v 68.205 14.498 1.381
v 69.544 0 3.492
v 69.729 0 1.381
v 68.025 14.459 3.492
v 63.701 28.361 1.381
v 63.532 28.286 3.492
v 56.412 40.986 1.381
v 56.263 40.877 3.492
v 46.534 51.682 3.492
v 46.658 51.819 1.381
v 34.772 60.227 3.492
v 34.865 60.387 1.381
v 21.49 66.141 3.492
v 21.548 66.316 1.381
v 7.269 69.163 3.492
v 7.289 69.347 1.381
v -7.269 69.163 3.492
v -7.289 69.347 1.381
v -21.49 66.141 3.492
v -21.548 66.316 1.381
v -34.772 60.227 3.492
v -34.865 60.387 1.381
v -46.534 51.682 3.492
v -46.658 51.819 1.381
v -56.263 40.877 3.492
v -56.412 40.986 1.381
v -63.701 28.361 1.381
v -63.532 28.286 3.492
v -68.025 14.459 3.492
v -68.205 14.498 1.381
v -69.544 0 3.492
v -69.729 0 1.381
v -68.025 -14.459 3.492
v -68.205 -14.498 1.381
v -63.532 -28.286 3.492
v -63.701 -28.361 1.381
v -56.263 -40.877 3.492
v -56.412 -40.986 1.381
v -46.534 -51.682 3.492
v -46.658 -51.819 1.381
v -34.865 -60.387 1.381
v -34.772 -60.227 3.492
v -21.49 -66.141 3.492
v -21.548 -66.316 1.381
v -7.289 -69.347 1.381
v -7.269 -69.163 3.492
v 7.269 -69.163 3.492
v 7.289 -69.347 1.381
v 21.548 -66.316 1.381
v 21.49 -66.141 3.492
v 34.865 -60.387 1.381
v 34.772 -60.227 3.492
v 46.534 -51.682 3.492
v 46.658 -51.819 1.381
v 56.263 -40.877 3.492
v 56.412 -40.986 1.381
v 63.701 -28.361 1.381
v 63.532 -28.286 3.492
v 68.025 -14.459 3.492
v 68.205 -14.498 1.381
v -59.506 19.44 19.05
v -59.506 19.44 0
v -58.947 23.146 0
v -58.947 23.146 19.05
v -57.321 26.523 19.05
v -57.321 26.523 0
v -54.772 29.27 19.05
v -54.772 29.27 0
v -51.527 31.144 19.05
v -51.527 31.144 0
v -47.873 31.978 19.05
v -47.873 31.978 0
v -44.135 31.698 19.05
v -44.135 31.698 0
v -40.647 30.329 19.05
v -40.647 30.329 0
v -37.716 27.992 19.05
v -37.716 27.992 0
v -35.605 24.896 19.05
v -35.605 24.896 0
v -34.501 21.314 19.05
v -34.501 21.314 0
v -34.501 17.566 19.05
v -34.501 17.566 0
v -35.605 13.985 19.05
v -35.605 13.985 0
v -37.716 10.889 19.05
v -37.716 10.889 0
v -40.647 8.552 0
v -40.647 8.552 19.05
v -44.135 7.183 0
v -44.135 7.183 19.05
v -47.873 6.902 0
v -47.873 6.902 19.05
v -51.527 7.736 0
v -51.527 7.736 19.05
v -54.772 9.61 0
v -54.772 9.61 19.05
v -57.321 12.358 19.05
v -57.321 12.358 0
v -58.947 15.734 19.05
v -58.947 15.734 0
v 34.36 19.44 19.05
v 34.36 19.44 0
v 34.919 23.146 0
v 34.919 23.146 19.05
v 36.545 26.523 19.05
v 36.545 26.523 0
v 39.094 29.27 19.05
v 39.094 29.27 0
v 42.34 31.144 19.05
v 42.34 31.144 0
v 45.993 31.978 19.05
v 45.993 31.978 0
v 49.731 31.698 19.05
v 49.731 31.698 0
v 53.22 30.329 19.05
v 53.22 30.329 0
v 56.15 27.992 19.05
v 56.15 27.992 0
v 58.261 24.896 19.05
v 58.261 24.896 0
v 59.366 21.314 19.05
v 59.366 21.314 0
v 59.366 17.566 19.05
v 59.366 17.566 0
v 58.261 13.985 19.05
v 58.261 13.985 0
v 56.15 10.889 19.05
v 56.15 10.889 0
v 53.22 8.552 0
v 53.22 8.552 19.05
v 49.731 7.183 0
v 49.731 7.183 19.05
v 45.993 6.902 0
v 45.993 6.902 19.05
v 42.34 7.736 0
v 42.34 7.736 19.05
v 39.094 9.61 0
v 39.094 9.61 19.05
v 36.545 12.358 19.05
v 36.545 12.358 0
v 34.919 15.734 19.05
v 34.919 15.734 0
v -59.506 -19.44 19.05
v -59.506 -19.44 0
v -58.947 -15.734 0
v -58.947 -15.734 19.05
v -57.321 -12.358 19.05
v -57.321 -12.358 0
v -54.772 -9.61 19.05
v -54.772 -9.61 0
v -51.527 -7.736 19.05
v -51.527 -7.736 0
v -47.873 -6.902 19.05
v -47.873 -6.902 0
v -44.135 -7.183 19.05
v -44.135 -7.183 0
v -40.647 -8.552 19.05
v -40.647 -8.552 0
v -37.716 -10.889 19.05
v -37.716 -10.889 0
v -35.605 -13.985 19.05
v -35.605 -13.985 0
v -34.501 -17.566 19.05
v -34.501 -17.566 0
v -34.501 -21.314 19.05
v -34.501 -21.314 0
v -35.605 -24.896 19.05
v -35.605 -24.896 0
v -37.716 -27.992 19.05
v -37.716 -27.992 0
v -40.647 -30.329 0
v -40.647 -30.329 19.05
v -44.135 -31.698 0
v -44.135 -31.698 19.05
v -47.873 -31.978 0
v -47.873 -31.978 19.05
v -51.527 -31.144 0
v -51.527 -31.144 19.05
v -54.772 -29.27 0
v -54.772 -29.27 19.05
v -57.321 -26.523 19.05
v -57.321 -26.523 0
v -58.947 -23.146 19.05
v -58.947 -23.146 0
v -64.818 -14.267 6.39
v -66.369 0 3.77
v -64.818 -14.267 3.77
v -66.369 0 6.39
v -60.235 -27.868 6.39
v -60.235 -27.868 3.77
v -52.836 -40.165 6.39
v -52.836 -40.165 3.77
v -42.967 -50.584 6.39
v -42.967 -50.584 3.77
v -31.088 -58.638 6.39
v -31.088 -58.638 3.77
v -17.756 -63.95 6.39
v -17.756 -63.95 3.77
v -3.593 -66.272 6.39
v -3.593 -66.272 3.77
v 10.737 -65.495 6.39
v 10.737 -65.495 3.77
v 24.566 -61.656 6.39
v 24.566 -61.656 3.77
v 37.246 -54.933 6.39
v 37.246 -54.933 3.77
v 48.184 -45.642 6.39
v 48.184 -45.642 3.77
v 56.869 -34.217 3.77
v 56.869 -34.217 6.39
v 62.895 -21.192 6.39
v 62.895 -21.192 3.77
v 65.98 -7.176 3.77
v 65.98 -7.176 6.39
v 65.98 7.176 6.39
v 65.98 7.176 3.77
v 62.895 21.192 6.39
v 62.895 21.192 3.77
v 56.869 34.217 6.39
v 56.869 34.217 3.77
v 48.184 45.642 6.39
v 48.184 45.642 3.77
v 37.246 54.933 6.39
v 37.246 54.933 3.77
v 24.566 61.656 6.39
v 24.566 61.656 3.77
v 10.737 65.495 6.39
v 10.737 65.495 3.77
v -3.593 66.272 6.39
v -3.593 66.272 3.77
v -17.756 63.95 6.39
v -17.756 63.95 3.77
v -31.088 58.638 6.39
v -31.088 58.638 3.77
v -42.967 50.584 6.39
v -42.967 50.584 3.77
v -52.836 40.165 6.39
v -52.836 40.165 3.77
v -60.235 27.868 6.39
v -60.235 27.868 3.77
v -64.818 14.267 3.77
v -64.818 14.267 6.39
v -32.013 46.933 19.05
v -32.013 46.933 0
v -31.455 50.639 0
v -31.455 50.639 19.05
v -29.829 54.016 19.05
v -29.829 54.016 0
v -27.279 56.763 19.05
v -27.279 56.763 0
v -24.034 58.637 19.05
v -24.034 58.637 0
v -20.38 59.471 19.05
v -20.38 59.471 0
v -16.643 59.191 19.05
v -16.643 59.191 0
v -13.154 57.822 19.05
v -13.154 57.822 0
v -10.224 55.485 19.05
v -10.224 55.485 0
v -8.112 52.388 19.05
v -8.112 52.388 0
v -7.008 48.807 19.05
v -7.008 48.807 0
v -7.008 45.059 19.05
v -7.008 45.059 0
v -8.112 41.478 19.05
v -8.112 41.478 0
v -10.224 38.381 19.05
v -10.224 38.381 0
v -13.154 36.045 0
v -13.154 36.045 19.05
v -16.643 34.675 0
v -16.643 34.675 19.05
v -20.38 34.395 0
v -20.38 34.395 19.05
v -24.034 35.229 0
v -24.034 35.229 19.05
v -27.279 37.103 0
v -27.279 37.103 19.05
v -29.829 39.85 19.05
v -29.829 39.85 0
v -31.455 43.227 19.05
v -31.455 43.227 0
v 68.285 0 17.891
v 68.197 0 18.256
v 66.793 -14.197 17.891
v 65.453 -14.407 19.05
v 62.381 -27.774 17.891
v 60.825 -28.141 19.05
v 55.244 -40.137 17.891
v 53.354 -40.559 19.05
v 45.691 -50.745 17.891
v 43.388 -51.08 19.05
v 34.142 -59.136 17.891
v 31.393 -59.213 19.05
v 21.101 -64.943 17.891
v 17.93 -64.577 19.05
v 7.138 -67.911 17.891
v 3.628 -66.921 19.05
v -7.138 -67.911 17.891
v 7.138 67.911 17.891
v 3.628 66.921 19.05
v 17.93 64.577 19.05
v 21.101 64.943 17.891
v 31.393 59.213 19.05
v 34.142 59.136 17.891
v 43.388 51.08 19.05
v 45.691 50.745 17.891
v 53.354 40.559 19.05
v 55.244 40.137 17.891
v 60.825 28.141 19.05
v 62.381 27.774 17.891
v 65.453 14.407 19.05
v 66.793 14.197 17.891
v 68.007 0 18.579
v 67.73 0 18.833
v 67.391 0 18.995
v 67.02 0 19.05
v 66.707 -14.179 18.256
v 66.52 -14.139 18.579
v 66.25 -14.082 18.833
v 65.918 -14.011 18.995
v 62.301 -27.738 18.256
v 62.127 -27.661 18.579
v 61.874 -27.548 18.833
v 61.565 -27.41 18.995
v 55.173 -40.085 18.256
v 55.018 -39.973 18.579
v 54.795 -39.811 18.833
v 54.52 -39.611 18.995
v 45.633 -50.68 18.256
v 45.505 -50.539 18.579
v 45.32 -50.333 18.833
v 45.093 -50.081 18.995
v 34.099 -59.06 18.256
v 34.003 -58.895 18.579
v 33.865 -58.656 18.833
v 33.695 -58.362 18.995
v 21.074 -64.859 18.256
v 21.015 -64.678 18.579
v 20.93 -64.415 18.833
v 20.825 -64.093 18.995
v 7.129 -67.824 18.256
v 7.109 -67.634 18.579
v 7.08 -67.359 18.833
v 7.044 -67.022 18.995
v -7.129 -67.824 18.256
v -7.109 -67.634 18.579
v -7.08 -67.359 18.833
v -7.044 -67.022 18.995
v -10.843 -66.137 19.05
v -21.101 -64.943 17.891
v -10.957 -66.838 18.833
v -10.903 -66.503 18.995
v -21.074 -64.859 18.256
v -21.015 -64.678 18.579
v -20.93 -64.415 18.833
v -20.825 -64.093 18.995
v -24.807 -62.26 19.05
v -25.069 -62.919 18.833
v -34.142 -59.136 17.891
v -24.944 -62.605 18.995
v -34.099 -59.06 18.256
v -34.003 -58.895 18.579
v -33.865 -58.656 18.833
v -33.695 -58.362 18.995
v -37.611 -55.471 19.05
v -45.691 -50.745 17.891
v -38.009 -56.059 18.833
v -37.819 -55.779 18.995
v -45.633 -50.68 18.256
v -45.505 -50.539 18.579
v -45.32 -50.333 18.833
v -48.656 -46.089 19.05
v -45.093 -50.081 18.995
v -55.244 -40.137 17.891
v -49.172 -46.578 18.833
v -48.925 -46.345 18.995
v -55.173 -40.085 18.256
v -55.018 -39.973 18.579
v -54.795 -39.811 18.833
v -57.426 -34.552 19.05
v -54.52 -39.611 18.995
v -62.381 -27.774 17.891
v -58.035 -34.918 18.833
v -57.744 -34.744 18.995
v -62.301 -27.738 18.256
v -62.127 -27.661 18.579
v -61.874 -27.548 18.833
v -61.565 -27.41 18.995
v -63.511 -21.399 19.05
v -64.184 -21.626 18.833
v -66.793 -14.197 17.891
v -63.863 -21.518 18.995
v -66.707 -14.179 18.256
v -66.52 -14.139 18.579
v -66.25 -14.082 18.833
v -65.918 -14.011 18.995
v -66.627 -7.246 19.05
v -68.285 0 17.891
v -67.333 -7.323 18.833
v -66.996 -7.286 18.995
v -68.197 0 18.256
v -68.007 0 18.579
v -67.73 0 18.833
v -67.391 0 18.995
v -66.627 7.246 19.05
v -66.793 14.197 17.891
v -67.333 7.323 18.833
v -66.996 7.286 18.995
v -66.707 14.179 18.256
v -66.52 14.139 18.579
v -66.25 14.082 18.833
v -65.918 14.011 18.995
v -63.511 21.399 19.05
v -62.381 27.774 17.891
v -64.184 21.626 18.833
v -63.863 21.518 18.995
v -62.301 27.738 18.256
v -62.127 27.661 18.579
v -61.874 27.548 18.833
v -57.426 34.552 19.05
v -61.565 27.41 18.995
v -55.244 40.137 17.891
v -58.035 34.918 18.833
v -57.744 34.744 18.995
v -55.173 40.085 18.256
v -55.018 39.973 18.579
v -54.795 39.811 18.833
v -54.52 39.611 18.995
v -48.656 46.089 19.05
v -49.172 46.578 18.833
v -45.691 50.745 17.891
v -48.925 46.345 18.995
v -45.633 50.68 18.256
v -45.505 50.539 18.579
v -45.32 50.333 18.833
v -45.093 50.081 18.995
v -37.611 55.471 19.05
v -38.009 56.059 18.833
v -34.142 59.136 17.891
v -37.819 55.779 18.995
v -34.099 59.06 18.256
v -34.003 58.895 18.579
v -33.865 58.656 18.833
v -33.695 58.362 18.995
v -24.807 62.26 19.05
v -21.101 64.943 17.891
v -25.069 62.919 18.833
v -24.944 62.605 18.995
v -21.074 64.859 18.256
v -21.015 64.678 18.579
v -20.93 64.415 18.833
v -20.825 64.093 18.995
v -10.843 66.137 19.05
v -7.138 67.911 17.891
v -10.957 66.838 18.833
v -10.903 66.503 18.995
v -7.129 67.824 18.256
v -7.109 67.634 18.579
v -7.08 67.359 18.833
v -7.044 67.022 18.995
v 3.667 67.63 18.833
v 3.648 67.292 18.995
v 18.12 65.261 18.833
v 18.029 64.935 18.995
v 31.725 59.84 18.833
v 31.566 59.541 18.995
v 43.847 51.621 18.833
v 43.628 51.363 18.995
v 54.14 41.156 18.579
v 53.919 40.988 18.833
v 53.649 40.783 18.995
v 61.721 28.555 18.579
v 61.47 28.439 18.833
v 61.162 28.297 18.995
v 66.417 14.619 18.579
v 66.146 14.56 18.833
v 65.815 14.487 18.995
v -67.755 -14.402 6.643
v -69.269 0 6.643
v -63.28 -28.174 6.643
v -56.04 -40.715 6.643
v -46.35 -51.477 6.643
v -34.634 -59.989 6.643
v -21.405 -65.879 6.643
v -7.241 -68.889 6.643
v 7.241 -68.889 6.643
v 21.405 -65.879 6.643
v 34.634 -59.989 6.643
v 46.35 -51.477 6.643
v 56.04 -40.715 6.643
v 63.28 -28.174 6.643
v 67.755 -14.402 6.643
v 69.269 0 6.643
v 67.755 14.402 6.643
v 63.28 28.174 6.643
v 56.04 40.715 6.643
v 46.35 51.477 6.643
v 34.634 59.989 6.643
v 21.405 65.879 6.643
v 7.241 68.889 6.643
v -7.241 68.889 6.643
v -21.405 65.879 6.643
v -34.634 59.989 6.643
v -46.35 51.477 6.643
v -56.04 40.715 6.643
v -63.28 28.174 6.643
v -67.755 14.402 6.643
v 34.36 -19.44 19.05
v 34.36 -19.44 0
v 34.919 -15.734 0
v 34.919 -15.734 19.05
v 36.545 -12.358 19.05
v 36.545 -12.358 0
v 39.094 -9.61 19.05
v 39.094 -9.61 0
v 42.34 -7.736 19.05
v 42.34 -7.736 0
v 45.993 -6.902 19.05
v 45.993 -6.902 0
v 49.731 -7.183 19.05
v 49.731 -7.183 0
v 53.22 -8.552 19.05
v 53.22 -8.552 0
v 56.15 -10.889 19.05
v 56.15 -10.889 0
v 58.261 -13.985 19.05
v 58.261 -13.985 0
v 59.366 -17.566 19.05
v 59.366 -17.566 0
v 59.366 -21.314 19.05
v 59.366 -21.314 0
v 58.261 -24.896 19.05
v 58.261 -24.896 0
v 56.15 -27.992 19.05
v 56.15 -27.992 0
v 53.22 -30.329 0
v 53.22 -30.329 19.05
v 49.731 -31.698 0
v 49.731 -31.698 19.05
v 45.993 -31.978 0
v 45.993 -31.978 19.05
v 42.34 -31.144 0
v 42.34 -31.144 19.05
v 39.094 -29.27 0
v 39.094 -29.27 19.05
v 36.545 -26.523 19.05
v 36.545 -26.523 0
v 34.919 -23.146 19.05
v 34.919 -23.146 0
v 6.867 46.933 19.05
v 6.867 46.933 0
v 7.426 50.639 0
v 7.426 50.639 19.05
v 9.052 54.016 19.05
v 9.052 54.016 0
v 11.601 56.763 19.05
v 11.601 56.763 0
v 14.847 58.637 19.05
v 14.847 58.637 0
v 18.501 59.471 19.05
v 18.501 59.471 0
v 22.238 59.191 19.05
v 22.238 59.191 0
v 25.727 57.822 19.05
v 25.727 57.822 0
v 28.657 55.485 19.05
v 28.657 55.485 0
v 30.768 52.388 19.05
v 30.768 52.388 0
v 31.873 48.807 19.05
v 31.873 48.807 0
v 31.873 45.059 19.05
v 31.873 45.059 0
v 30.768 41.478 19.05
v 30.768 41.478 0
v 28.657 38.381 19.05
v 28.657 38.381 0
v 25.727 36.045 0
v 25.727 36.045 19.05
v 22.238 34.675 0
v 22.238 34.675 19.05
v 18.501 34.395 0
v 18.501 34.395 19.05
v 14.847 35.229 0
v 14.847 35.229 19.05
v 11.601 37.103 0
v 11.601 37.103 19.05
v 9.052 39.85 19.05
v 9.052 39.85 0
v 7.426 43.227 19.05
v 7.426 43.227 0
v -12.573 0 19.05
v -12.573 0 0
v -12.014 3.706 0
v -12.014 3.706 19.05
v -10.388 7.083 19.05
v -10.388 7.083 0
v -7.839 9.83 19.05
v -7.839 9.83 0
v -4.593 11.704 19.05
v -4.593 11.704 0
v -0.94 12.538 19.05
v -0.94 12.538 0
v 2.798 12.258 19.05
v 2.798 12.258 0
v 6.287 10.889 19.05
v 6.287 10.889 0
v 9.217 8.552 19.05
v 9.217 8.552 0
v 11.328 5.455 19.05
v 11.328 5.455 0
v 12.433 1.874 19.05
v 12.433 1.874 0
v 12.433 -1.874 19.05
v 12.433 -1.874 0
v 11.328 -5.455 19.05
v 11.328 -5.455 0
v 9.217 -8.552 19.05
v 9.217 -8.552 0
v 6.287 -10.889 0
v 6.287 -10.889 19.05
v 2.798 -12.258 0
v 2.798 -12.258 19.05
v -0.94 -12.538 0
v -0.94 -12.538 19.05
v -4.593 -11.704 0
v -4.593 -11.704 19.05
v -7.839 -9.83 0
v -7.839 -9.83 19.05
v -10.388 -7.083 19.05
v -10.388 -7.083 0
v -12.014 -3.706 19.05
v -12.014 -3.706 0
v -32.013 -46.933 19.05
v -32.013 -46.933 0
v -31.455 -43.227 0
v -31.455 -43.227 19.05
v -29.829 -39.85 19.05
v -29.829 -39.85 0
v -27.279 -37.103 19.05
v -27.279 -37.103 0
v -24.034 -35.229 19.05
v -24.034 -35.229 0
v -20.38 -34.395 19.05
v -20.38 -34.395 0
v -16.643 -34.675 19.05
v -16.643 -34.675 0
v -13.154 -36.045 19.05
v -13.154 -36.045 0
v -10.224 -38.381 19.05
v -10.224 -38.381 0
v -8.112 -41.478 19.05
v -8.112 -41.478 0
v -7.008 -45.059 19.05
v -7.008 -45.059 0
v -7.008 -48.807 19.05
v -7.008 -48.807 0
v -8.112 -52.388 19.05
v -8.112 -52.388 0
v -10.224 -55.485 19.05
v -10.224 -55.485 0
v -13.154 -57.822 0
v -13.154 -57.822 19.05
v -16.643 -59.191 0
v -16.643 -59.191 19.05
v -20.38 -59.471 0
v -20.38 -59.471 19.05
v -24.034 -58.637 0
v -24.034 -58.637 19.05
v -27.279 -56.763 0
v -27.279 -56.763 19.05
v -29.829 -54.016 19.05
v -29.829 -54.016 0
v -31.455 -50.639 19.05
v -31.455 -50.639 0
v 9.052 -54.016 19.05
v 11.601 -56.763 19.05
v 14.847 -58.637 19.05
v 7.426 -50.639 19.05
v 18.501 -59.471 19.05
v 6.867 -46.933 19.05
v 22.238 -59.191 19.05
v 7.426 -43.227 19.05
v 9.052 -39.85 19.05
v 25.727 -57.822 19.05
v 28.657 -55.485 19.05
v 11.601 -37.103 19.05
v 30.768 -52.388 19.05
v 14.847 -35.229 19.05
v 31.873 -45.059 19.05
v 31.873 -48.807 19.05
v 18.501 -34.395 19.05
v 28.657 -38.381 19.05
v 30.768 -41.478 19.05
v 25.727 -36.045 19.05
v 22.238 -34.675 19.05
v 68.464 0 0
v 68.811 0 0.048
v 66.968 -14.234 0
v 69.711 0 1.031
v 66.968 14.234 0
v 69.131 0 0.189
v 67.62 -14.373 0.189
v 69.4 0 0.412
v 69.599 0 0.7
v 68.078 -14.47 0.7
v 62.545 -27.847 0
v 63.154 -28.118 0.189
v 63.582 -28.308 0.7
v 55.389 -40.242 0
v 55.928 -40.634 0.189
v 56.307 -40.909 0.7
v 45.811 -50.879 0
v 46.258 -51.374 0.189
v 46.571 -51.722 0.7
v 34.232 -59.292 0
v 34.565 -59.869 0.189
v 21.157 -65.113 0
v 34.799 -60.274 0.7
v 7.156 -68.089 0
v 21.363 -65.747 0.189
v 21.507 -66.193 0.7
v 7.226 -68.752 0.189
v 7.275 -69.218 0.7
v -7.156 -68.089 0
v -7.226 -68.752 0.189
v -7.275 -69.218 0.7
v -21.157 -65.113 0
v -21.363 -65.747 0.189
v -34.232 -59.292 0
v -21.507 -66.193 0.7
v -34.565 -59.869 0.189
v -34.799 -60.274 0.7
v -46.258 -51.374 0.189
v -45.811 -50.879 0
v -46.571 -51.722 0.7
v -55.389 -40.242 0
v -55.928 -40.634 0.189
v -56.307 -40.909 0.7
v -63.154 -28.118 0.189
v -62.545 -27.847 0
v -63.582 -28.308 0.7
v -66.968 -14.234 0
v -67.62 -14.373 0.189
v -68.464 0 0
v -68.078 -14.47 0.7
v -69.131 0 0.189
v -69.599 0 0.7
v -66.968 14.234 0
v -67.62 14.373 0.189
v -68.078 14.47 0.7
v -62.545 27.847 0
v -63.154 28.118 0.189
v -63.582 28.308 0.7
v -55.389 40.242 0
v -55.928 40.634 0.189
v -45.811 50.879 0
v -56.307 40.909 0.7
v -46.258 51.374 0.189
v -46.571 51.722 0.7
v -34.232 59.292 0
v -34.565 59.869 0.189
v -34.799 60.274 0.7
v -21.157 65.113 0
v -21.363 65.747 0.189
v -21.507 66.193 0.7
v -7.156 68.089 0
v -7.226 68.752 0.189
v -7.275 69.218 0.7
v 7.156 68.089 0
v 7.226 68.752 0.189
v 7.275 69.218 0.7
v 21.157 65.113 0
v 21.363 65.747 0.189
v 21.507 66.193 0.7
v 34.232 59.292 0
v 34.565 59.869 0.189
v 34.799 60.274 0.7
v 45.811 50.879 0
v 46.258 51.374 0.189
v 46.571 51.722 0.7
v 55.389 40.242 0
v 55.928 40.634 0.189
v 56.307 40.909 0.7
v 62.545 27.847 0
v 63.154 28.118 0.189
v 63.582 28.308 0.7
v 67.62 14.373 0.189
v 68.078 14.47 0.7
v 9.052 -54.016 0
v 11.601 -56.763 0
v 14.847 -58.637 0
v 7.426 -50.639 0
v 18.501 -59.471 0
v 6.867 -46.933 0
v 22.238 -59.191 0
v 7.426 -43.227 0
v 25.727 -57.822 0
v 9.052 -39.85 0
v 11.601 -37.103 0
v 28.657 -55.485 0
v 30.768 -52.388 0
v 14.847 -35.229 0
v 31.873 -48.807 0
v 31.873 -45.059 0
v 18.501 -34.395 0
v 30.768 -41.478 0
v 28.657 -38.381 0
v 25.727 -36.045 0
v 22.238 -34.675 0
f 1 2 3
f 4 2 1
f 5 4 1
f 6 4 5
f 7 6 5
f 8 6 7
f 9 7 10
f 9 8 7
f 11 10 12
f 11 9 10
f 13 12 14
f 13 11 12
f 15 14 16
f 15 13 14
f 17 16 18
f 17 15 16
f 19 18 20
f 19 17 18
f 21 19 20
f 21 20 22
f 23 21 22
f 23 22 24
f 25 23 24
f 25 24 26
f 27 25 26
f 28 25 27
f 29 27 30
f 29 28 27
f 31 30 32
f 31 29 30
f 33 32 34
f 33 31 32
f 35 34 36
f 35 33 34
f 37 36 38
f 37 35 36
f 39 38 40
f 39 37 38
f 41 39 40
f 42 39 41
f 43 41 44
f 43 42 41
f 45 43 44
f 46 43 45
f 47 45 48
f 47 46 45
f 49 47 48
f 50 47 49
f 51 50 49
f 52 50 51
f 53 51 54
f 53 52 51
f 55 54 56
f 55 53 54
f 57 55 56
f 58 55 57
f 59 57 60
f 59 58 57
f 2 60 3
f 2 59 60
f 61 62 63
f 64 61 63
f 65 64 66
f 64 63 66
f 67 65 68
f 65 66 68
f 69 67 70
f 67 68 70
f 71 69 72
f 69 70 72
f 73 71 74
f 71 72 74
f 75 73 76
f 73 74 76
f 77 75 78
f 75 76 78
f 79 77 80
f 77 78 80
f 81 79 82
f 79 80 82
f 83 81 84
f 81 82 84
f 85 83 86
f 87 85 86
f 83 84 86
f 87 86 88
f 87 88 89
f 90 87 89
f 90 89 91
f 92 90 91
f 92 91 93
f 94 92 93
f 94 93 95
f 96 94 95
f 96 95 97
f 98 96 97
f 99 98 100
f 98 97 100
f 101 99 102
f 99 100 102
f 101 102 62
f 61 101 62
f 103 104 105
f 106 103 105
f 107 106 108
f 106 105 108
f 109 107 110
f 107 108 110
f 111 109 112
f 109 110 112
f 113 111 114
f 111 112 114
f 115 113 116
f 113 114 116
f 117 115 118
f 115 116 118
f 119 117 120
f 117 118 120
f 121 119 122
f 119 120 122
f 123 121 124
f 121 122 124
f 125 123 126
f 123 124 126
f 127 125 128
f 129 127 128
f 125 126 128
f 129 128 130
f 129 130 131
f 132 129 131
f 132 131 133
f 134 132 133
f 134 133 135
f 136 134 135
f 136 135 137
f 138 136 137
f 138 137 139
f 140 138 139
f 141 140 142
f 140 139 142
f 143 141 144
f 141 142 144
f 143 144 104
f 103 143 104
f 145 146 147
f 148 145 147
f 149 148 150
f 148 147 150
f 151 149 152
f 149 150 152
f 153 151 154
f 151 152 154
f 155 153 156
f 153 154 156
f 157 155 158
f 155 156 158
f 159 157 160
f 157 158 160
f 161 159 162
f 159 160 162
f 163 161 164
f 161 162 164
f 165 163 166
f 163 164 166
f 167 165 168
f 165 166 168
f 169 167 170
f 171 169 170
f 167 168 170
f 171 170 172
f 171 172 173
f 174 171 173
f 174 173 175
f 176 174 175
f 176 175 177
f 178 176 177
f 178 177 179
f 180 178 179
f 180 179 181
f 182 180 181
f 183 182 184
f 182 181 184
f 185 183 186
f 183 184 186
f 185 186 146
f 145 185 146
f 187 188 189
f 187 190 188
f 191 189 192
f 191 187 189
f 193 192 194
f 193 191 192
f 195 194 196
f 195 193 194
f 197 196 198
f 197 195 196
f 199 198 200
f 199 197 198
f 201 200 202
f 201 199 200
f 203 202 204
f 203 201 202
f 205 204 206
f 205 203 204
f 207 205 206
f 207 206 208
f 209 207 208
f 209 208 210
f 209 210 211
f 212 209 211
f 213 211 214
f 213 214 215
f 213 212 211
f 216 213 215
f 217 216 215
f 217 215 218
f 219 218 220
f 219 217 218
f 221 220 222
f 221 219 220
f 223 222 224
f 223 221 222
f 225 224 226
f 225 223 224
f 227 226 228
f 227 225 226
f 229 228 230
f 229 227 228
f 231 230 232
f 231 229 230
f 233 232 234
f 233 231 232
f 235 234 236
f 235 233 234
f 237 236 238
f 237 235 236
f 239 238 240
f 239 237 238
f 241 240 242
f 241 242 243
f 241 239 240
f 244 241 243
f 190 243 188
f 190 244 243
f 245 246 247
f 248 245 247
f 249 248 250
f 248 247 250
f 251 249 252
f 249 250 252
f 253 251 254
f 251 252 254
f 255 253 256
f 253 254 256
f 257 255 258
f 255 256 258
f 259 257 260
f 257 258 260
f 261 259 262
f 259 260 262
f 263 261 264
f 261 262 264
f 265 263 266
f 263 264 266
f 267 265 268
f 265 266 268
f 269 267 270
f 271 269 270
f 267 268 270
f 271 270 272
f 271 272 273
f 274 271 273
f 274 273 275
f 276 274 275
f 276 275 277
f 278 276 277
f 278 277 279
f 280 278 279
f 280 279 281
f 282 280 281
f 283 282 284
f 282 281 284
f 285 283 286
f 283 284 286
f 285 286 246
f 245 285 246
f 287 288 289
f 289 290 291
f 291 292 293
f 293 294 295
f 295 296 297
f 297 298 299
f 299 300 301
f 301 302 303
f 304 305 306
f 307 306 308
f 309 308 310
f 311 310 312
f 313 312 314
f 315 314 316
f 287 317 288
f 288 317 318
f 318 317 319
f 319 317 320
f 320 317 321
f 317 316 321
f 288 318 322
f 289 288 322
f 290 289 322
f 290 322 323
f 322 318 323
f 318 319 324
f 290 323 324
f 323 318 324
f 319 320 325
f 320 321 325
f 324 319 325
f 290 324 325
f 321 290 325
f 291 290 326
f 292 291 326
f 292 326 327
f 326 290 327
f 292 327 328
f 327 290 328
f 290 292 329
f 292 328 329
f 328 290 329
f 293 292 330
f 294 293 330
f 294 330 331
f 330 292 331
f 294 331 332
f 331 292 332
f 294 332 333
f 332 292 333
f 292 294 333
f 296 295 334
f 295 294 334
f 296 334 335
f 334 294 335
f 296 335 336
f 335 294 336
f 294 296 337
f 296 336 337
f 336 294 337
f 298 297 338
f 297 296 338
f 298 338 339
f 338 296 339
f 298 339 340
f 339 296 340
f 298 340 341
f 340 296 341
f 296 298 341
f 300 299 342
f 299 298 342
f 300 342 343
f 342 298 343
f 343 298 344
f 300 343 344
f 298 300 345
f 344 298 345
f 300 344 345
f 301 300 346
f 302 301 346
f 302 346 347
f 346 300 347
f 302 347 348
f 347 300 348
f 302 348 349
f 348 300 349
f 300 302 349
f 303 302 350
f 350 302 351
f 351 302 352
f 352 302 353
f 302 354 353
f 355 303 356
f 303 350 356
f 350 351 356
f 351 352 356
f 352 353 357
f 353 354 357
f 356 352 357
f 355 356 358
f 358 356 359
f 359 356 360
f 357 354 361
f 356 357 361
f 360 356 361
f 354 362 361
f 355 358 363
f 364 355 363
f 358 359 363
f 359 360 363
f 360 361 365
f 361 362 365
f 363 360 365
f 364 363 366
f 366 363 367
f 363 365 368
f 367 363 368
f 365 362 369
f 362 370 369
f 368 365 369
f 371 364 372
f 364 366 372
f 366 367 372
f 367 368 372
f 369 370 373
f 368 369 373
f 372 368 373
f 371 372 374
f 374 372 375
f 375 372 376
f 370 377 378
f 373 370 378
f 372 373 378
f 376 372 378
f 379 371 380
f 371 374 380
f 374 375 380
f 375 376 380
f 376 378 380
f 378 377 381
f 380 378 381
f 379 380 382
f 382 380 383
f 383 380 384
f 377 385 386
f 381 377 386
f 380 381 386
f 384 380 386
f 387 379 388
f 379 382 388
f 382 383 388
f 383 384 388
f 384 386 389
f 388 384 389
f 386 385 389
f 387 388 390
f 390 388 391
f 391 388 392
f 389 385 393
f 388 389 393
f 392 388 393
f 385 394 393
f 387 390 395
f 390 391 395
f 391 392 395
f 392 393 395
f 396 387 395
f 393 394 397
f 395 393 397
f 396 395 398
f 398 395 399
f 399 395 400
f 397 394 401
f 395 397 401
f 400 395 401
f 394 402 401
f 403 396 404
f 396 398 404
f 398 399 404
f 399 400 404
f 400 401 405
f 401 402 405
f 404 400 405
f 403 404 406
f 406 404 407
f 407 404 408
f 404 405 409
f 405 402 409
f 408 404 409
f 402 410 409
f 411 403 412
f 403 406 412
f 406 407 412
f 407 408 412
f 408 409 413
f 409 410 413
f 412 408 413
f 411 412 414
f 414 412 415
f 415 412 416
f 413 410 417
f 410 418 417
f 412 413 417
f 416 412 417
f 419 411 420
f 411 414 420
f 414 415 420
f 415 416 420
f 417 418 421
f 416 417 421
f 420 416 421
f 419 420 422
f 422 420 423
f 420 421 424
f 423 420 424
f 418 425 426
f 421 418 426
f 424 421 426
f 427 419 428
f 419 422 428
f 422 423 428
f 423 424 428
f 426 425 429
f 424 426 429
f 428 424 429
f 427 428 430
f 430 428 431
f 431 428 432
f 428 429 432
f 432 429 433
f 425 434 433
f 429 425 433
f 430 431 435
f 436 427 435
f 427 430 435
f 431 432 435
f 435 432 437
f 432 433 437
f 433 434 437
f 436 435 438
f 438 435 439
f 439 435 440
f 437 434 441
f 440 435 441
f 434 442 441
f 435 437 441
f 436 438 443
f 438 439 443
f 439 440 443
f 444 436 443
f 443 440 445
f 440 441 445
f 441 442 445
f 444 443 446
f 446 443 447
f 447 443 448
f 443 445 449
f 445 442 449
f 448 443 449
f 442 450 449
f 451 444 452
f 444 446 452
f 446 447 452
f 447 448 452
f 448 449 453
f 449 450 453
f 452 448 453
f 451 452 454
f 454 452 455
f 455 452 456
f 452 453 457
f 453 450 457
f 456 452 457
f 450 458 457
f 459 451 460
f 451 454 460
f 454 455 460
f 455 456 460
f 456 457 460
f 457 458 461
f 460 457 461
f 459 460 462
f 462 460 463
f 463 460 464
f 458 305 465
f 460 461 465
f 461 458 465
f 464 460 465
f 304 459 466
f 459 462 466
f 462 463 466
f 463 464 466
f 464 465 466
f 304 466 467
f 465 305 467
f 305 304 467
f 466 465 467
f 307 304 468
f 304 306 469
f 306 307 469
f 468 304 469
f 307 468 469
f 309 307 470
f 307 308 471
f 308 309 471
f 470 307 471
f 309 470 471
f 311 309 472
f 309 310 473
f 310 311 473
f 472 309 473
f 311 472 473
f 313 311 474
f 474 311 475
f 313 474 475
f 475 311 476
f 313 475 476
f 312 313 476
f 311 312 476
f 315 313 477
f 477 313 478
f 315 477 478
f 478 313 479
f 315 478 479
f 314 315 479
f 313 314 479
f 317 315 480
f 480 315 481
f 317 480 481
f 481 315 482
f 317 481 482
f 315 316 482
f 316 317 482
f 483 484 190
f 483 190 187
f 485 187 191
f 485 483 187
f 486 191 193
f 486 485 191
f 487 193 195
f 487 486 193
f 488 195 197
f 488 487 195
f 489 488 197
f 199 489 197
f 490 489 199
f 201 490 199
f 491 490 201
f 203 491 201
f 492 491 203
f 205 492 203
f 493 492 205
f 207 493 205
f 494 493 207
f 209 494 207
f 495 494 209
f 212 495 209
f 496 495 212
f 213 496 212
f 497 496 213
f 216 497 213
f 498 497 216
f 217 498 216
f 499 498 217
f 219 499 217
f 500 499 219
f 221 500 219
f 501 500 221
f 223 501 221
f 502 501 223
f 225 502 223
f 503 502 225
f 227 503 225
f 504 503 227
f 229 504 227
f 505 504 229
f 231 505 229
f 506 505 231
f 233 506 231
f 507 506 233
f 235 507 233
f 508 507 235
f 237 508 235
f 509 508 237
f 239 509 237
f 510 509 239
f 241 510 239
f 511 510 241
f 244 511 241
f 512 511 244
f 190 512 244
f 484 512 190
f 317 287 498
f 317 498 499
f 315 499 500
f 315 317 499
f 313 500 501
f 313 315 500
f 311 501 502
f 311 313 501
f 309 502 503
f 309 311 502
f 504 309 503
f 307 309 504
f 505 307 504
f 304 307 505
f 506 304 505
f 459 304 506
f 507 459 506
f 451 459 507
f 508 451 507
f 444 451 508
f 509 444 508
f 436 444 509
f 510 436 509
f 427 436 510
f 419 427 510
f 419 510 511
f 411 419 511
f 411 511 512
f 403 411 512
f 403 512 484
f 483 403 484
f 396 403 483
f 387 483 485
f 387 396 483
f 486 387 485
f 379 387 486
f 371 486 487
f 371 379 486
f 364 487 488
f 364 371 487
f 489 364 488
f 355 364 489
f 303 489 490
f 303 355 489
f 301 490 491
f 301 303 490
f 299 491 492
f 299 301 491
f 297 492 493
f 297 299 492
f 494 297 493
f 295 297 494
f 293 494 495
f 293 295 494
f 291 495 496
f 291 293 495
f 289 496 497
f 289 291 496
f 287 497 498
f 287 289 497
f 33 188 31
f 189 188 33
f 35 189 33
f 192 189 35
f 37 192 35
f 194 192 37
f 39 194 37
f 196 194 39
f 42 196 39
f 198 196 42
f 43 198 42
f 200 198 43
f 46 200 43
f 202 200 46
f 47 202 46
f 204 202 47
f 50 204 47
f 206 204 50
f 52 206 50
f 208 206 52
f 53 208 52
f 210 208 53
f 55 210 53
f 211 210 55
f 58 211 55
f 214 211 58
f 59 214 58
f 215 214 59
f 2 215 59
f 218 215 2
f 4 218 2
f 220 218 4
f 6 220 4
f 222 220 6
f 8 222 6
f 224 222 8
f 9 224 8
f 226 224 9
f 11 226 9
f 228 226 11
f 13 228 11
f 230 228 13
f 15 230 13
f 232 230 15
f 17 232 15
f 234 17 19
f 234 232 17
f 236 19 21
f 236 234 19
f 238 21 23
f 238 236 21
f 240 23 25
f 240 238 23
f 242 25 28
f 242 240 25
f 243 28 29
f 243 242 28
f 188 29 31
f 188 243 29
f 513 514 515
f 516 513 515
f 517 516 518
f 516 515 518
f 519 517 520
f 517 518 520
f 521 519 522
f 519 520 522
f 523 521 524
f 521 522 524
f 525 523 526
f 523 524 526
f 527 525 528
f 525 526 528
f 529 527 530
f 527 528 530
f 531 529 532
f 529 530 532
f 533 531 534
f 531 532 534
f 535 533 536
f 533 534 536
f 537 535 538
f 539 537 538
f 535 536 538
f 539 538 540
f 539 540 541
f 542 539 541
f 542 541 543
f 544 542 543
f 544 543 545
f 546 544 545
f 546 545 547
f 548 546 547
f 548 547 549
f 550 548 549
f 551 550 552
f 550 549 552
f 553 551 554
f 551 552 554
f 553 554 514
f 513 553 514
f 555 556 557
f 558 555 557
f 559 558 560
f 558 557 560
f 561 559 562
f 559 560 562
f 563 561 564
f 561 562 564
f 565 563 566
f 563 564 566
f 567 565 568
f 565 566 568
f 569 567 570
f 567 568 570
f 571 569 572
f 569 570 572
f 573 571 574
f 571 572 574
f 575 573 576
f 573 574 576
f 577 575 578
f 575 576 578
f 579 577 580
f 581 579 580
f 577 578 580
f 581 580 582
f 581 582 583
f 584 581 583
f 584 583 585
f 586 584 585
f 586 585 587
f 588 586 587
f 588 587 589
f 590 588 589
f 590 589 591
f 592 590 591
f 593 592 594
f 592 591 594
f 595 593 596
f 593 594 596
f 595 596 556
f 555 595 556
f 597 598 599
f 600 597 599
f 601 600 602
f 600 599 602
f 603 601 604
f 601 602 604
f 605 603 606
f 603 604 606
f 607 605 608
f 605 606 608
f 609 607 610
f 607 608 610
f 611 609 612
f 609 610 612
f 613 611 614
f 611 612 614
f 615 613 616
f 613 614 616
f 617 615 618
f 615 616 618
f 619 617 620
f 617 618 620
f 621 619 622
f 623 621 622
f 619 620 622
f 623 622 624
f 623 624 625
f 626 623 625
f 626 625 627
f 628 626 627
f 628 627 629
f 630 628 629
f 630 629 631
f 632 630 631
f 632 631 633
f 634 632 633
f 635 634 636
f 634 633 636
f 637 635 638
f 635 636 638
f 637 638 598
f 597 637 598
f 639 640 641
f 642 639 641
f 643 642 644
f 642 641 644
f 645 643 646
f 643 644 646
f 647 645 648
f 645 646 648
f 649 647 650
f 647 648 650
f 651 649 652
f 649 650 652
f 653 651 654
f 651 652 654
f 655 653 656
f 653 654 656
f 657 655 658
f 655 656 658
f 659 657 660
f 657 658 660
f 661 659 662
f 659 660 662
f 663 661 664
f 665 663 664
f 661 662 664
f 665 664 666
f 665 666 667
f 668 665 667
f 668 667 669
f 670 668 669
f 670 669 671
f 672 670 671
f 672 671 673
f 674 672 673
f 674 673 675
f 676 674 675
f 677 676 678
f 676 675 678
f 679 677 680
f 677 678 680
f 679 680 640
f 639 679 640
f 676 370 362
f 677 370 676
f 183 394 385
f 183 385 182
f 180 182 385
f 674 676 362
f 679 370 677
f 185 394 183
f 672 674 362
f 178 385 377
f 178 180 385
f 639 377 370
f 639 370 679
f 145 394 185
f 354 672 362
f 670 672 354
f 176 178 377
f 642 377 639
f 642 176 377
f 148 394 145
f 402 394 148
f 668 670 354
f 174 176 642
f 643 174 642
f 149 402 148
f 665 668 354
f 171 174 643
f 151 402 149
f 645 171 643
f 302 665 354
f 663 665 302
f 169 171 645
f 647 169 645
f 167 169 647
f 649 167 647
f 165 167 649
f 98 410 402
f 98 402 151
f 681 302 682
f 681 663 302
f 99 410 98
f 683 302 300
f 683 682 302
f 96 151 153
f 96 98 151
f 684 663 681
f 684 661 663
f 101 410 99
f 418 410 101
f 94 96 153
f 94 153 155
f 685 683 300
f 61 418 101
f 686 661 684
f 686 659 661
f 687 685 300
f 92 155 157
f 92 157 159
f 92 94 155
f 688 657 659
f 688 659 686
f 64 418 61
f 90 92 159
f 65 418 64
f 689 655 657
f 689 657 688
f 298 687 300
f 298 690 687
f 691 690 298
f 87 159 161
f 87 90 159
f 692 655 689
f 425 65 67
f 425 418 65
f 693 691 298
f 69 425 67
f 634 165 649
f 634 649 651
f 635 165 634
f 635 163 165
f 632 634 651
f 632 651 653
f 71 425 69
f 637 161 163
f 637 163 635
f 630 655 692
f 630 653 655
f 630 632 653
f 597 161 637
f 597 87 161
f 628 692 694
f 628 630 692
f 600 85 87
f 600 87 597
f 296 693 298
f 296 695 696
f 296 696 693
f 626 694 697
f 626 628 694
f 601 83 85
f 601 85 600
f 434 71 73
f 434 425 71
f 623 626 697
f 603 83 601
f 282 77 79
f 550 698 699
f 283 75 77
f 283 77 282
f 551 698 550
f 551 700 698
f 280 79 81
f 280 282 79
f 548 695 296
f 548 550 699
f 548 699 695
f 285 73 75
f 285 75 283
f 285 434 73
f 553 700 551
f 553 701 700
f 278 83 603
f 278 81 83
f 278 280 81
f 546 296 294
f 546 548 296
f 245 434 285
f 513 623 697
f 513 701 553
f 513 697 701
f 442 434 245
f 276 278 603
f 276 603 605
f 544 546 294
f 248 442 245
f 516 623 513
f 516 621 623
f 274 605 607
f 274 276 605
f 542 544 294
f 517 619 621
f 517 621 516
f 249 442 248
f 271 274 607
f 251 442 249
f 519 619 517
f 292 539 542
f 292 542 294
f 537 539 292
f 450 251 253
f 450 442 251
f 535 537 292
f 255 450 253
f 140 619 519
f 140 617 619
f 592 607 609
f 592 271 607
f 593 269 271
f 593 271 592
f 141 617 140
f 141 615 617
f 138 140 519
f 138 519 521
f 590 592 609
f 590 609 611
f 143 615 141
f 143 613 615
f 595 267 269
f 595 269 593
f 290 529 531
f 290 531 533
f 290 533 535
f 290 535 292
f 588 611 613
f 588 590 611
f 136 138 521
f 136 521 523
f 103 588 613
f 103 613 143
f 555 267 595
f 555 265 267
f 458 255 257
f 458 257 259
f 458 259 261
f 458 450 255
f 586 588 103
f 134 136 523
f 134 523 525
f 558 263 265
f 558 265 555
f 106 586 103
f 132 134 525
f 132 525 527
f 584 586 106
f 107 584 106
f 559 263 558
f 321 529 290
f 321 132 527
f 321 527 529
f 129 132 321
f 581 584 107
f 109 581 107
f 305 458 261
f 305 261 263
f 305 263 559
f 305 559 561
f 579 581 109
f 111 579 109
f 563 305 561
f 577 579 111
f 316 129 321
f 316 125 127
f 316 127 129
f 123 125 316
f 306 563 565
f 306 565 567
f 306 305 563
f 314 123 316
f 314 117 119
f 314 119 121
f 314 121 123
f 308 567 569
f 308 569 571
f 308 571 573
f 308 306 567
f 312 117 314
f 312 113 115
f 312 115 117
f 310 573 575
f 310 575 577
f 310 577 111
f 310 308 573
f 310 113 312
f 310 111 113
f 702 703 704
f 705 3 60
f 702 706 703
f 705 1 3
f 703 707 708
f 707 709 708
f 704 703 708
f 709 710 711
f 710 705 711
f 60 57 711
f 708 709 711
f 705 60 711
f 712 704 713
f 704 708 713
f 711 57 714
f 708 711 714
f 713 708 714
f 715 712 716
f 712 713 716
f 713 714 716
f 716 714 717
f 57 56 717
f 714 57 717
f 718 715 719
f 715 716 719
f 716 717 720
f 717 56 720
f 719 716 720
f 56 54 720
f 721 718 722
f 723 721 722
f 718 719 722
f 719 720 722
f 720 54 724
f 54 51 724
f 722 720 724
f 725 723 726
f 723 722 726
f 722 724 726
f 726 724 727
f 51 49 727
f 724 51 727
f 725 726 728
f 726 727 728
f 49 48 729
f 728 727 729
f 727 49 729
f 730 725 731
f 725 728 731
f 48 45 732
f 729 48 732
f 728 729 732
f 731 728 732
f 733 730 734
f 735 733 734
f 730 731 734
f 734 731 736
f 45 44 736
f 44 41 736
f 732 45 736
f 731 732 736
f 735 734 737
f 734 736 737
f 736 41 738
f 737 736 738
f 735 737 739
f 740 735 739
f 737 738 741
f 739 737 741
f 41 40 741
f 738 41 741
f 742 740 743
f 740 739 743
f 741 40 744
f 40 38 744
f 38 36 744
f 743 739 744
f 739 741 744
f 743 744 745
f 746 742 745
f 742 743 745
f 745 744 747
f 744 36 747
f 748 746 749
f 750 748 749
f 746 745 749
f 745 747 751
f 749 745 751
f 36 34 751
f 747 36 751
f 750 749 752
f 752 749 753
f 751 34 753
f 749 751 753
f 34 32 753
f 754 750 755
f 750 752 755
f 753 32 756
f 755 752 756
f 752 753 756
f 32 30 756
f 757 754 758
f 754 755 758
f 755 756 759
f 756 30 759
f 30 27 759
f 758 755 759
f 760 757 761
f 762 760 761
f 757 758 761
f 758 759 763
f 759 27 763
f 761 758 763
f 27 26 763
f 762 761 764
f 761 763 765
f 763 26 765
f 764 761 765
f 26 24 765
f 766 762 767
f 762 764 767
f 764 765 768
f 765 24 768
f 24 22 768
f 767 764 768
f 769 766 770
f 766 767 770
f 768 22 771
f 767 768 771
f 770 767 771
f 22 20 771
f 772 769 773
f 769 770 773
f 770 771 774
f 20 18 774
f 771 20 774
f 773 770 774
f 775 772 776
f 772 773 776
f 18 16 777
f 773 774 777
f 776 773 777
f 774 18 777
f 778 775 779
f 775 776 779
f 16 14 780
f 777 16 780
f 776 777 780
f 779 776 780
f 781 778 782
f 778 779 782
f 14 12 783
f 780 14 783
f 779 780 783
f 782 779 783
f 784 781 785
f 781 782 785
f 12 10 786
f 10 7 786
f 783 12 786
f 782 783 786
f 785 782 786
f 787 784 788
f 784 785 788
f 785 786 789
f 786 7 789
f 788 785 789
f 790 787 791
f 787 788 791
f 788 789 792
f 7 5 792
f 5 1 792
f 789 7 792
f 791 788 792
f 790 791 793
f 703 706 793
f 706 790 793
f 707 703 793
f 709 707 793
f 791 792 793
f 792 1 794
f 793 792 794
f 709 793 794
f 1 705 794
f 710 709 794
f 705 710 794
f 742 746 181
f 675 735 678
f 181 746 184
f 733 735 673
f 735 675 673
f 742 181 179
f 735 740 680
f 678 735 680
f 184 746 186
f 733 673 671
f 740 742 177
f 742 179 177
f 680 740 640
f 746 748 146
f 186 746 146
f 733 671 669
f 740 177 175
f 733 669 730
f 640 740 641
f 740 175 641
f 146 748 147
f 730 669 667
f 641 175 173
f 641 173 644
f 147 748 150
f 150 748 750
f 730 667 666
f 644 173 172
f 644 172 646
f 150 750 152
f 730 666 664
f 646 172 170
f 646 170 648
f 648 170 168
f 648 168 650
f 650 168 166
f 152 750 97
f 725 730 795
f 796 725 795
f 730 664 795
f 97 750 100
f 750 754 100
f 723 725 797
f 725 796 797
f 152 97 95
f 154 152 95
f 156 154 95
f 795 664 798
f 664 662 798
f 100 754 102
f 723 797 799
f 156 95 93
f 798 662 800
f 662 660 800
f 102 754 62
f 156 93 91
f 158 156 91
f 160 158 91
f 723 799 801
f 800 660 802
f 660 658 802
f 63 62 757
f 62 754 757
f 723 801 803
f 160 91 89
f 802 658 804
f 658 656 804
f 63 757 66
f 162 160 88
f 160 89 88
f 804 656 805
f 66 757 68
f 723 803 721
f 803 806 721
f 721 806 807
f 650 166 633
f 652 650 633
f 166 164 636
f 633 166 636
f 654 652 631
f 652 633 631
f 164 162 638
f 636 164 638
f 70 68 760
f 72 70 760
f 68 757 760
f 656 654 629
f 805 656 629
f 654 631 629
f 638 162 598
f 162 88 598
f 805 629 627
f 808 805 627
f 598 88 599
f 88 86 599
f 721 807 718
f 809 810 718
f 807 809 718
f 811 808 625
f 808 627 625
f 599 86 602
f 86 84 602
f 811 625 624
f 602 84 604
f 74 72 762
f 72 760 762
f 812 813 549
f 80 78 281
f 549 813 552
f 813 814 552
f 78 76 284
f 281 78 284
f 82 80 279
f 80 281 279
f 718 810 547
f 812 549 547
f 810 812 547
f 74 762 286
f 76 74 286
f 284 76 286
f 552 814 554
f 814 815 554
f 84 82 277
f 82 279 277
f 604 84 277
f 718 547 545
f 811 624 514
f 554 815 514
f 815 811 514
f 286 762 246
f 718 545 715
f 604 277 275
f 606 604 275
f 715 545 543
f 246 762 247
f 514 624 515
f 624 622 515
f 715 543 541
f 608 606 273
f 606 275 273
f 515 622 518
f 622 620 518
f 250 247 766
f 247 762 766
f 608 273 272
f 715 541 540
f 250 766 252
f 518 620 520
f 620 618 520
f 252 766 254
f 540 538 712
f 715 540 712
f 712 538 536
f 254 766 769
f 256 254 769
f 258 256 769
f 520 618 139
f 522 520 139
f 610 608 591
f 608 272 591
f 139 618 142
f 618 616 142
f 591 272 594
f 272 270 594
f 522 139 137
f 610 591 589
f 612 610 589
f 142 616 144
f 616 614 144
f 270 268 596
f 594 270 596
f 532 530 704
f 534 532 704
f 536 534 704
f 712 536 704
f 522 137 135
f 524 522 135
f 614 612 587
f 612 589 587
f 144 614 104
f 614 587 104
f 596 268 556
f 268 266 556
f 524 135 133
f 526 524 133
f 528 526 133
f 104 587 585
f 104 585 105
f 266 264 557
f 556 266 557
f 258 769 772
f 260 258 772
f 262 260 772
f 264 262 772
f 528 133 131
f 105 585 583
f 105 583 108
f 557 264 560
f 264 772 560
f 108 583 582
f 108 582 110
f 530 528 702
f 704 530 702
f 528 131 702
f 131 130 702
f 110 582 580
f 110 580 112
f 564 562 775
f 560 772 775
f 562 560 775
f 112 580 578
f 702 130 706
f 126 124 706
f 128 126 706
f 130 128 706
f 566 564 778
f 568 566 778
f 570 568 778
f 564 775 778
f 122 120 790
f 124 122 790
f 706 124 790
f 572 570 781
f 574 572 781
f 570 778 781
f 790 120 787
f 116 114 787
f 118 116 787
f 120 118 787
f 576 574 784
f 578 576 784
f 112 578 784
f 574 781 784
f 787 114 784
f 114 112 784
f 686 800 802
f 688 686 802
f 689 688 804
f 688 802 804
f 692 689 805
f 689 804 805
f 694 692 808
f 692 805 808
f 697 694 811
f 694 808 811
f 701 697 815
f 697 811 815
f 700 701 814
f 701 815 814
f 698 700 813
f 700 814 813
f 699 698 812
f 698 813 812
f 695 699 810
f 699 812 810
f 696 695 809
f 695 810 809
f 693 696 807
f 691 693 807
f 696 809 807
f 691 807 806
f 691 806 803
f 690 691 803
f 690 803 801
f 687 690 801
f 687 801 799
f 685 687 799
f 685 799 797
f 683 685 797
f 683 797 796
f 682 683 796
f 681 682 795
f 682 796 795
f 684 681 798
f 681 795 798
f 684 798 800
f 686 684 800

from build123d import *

# Parameters (mm, degrees)
SKETCH1_R           = 69.85
BOSS_EXTRUDE1_DEPTH = 19.05
BOSS_EXTRUDE1_TAPER = 5
FILLET2_R           = 1.27
SKETCH3_R           = 12.573
CUT_EXTRUDE1_DEPTH  = 19.05


with BuildPart() as part:
    # Sketch1 → Boss-Extrude1 (new body)
    with BuildSketch(Plane.XY):
        Circle(SKETCH1_R)
    extrude(amount=BOSS_EXTRUDE1_DEPTH, taper=BOSS_EXTRUDE1_TAPER)

    # Fillet2
    fillet2_edges = [part.edges().sort_by_distance(p)[0] for p in [
        (-69.85, 0, 0),
        (-68.18334096, 0, 19.05),
    ]]
    fillet(fillet2_edges, radius=FILLET2_R)

    # Sketch2 → Cut-Revolve1 (revolve, cut)
    with BuildSketch(Plane(origin=(0, 0, 0), x_dir=(1, 0, 0), z_dir=(0, 1, 0))):
        Polygon((-66.369445843, -3.770276507), (-66.369445843, -6.389723493), (-69.544445843, -6.6675), (-69.544445843, -3.4925), align=None)
    revolve(axis=Axis((0, 0, 0), (0, 0, 1)), mode=Mode.SUBTRACT)

    # Sketch3 → Cut-Extrude1 (cut)
    with BuildSketch(Plane(origin=(0, 0, 0), x_dir=(-1, 0, 0), z_dir=(0, 0, -1))):
        with Locations((-19.440318364, 46.933080252)):
            Circle(SKETCH3_R)
        with Locations((19.440318364, 46.933080252)):
            Circle(SKETCH3_R)
        with Locations((46.933080252, 19.440318364)):
            Circle(SKETCH3_R)
        with Locations((46.933080252, -19.440318364)):
            Circle(SKETCH3_R)
        with Locations((19.440318364, -46.933080252)):
            Circle(SKETCH3_R)
        with Locations((-19.440318364, -46.933080252)):
            Circle(SKETCH3_R)
        with Locations((-46.933080252, -19.440318364)):
            Circle(SKETCH3_R)
        with Locations((-46.933080252, 19.440318364)):
            Circle(SKETCH3_R)
        Circle(SKETCH3_R)
    extrude(amount=-CUT_EXTRUDE1_DEPTH, mode=Mode.SUBTRACT)


solid = part.part
